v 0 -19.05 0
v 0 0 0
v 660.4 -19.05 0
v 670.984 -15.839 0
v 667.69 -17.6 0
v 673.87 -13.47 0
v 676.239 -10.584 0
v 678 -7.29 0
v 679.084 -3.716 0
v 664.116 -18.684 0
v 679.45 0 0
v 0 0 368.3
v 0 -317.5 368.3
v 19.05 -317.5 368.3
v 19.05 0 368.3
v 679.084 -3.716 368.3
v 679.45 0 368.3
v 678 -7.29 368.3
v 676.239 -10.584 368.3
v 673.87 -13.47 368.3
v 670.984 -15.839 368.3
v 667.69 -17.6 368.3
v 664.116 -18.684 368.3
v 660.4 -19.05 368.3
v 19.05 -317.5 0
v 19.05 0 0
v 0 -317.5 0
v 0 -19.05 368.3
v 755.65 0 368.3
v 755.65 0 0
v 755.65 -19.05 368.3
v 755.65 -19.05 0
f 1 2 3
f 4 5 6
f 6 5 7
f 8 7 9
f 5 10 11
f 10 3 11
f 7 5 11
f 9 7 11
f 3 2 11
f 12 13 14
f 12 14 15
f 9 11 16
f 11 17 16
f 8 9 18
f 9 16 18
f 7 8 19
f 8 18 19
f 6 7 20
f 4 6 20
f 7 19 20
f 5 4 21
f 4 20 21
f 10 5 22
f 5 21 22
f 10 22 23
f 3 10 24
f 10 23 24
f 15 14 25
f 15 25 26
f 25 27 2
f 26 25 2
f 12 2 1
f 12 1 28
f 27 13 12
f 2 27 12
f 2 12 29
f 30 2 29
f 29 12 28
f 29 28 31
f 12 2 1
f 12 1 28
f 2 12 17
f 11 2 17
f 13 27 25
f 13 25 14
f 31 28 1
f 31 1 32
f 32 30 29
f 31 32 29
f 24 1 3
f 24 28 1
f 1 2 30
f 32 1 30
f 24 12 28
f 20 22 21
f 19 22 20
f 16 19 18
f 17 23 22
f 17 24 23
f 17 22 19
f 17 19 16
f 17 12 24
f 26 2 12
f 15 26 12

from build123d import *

# Parameters (mm, degrees)
F0_W     = 755.65
F0_H     = 368.3
F1_DEPTH = 19.05
F2_W     = 679.45
F2_H     = 368.3
F3_DEPTH = 19.05
F4_R     = 19.04999
F5_W     = 317.5
F5_H     = 368.3
F6_DEPTH = 19.05


# Not quite as in the source:
# - a fillet or chamfer is up to 0.001 mm smaller than in the source, because OpenCascade refuses the exact size


with BuildPart() as f1:
    # F0 (on Front) → F1 (new body)
    with BuildSketch(Plane.XZ):
        with Locations((377.825, 184.15)):
            Rectangle(F0_W, F0_H)
    extrude(amount=F1_DEPTH)


with BuildPart() as f3:
    # F2 (on Front) → F3 (new body)
    with BuildSketch(Plane.XZ):
        with Locations((339.725, 184.15)):
            Rectangle(F2_W, F2_H)
    extrude(amount=F3_DEPTH)

    # F4 (radius 19.05 in the source; OpenCascade refuses exactly that, so slightly less here)
    f4_edges = [f3.edges().sort_by_distance(p)[0] for p in [
        (679.45, -19.05, 184.15),
    ]]
    fillet(f4_edges, radius=F4_R)


with BuildPart() as f6:
    # F5 (on Right) → F6 (new body)
    with BuildSketch(Plane.YZ):
        with Locations((-158.75, 184.15)):
            Rectangle(F5_W, F5_H)
    extrude(amount=F6_DEPTH)


solid = Compound([f1.part, f3.part, f6.part])
